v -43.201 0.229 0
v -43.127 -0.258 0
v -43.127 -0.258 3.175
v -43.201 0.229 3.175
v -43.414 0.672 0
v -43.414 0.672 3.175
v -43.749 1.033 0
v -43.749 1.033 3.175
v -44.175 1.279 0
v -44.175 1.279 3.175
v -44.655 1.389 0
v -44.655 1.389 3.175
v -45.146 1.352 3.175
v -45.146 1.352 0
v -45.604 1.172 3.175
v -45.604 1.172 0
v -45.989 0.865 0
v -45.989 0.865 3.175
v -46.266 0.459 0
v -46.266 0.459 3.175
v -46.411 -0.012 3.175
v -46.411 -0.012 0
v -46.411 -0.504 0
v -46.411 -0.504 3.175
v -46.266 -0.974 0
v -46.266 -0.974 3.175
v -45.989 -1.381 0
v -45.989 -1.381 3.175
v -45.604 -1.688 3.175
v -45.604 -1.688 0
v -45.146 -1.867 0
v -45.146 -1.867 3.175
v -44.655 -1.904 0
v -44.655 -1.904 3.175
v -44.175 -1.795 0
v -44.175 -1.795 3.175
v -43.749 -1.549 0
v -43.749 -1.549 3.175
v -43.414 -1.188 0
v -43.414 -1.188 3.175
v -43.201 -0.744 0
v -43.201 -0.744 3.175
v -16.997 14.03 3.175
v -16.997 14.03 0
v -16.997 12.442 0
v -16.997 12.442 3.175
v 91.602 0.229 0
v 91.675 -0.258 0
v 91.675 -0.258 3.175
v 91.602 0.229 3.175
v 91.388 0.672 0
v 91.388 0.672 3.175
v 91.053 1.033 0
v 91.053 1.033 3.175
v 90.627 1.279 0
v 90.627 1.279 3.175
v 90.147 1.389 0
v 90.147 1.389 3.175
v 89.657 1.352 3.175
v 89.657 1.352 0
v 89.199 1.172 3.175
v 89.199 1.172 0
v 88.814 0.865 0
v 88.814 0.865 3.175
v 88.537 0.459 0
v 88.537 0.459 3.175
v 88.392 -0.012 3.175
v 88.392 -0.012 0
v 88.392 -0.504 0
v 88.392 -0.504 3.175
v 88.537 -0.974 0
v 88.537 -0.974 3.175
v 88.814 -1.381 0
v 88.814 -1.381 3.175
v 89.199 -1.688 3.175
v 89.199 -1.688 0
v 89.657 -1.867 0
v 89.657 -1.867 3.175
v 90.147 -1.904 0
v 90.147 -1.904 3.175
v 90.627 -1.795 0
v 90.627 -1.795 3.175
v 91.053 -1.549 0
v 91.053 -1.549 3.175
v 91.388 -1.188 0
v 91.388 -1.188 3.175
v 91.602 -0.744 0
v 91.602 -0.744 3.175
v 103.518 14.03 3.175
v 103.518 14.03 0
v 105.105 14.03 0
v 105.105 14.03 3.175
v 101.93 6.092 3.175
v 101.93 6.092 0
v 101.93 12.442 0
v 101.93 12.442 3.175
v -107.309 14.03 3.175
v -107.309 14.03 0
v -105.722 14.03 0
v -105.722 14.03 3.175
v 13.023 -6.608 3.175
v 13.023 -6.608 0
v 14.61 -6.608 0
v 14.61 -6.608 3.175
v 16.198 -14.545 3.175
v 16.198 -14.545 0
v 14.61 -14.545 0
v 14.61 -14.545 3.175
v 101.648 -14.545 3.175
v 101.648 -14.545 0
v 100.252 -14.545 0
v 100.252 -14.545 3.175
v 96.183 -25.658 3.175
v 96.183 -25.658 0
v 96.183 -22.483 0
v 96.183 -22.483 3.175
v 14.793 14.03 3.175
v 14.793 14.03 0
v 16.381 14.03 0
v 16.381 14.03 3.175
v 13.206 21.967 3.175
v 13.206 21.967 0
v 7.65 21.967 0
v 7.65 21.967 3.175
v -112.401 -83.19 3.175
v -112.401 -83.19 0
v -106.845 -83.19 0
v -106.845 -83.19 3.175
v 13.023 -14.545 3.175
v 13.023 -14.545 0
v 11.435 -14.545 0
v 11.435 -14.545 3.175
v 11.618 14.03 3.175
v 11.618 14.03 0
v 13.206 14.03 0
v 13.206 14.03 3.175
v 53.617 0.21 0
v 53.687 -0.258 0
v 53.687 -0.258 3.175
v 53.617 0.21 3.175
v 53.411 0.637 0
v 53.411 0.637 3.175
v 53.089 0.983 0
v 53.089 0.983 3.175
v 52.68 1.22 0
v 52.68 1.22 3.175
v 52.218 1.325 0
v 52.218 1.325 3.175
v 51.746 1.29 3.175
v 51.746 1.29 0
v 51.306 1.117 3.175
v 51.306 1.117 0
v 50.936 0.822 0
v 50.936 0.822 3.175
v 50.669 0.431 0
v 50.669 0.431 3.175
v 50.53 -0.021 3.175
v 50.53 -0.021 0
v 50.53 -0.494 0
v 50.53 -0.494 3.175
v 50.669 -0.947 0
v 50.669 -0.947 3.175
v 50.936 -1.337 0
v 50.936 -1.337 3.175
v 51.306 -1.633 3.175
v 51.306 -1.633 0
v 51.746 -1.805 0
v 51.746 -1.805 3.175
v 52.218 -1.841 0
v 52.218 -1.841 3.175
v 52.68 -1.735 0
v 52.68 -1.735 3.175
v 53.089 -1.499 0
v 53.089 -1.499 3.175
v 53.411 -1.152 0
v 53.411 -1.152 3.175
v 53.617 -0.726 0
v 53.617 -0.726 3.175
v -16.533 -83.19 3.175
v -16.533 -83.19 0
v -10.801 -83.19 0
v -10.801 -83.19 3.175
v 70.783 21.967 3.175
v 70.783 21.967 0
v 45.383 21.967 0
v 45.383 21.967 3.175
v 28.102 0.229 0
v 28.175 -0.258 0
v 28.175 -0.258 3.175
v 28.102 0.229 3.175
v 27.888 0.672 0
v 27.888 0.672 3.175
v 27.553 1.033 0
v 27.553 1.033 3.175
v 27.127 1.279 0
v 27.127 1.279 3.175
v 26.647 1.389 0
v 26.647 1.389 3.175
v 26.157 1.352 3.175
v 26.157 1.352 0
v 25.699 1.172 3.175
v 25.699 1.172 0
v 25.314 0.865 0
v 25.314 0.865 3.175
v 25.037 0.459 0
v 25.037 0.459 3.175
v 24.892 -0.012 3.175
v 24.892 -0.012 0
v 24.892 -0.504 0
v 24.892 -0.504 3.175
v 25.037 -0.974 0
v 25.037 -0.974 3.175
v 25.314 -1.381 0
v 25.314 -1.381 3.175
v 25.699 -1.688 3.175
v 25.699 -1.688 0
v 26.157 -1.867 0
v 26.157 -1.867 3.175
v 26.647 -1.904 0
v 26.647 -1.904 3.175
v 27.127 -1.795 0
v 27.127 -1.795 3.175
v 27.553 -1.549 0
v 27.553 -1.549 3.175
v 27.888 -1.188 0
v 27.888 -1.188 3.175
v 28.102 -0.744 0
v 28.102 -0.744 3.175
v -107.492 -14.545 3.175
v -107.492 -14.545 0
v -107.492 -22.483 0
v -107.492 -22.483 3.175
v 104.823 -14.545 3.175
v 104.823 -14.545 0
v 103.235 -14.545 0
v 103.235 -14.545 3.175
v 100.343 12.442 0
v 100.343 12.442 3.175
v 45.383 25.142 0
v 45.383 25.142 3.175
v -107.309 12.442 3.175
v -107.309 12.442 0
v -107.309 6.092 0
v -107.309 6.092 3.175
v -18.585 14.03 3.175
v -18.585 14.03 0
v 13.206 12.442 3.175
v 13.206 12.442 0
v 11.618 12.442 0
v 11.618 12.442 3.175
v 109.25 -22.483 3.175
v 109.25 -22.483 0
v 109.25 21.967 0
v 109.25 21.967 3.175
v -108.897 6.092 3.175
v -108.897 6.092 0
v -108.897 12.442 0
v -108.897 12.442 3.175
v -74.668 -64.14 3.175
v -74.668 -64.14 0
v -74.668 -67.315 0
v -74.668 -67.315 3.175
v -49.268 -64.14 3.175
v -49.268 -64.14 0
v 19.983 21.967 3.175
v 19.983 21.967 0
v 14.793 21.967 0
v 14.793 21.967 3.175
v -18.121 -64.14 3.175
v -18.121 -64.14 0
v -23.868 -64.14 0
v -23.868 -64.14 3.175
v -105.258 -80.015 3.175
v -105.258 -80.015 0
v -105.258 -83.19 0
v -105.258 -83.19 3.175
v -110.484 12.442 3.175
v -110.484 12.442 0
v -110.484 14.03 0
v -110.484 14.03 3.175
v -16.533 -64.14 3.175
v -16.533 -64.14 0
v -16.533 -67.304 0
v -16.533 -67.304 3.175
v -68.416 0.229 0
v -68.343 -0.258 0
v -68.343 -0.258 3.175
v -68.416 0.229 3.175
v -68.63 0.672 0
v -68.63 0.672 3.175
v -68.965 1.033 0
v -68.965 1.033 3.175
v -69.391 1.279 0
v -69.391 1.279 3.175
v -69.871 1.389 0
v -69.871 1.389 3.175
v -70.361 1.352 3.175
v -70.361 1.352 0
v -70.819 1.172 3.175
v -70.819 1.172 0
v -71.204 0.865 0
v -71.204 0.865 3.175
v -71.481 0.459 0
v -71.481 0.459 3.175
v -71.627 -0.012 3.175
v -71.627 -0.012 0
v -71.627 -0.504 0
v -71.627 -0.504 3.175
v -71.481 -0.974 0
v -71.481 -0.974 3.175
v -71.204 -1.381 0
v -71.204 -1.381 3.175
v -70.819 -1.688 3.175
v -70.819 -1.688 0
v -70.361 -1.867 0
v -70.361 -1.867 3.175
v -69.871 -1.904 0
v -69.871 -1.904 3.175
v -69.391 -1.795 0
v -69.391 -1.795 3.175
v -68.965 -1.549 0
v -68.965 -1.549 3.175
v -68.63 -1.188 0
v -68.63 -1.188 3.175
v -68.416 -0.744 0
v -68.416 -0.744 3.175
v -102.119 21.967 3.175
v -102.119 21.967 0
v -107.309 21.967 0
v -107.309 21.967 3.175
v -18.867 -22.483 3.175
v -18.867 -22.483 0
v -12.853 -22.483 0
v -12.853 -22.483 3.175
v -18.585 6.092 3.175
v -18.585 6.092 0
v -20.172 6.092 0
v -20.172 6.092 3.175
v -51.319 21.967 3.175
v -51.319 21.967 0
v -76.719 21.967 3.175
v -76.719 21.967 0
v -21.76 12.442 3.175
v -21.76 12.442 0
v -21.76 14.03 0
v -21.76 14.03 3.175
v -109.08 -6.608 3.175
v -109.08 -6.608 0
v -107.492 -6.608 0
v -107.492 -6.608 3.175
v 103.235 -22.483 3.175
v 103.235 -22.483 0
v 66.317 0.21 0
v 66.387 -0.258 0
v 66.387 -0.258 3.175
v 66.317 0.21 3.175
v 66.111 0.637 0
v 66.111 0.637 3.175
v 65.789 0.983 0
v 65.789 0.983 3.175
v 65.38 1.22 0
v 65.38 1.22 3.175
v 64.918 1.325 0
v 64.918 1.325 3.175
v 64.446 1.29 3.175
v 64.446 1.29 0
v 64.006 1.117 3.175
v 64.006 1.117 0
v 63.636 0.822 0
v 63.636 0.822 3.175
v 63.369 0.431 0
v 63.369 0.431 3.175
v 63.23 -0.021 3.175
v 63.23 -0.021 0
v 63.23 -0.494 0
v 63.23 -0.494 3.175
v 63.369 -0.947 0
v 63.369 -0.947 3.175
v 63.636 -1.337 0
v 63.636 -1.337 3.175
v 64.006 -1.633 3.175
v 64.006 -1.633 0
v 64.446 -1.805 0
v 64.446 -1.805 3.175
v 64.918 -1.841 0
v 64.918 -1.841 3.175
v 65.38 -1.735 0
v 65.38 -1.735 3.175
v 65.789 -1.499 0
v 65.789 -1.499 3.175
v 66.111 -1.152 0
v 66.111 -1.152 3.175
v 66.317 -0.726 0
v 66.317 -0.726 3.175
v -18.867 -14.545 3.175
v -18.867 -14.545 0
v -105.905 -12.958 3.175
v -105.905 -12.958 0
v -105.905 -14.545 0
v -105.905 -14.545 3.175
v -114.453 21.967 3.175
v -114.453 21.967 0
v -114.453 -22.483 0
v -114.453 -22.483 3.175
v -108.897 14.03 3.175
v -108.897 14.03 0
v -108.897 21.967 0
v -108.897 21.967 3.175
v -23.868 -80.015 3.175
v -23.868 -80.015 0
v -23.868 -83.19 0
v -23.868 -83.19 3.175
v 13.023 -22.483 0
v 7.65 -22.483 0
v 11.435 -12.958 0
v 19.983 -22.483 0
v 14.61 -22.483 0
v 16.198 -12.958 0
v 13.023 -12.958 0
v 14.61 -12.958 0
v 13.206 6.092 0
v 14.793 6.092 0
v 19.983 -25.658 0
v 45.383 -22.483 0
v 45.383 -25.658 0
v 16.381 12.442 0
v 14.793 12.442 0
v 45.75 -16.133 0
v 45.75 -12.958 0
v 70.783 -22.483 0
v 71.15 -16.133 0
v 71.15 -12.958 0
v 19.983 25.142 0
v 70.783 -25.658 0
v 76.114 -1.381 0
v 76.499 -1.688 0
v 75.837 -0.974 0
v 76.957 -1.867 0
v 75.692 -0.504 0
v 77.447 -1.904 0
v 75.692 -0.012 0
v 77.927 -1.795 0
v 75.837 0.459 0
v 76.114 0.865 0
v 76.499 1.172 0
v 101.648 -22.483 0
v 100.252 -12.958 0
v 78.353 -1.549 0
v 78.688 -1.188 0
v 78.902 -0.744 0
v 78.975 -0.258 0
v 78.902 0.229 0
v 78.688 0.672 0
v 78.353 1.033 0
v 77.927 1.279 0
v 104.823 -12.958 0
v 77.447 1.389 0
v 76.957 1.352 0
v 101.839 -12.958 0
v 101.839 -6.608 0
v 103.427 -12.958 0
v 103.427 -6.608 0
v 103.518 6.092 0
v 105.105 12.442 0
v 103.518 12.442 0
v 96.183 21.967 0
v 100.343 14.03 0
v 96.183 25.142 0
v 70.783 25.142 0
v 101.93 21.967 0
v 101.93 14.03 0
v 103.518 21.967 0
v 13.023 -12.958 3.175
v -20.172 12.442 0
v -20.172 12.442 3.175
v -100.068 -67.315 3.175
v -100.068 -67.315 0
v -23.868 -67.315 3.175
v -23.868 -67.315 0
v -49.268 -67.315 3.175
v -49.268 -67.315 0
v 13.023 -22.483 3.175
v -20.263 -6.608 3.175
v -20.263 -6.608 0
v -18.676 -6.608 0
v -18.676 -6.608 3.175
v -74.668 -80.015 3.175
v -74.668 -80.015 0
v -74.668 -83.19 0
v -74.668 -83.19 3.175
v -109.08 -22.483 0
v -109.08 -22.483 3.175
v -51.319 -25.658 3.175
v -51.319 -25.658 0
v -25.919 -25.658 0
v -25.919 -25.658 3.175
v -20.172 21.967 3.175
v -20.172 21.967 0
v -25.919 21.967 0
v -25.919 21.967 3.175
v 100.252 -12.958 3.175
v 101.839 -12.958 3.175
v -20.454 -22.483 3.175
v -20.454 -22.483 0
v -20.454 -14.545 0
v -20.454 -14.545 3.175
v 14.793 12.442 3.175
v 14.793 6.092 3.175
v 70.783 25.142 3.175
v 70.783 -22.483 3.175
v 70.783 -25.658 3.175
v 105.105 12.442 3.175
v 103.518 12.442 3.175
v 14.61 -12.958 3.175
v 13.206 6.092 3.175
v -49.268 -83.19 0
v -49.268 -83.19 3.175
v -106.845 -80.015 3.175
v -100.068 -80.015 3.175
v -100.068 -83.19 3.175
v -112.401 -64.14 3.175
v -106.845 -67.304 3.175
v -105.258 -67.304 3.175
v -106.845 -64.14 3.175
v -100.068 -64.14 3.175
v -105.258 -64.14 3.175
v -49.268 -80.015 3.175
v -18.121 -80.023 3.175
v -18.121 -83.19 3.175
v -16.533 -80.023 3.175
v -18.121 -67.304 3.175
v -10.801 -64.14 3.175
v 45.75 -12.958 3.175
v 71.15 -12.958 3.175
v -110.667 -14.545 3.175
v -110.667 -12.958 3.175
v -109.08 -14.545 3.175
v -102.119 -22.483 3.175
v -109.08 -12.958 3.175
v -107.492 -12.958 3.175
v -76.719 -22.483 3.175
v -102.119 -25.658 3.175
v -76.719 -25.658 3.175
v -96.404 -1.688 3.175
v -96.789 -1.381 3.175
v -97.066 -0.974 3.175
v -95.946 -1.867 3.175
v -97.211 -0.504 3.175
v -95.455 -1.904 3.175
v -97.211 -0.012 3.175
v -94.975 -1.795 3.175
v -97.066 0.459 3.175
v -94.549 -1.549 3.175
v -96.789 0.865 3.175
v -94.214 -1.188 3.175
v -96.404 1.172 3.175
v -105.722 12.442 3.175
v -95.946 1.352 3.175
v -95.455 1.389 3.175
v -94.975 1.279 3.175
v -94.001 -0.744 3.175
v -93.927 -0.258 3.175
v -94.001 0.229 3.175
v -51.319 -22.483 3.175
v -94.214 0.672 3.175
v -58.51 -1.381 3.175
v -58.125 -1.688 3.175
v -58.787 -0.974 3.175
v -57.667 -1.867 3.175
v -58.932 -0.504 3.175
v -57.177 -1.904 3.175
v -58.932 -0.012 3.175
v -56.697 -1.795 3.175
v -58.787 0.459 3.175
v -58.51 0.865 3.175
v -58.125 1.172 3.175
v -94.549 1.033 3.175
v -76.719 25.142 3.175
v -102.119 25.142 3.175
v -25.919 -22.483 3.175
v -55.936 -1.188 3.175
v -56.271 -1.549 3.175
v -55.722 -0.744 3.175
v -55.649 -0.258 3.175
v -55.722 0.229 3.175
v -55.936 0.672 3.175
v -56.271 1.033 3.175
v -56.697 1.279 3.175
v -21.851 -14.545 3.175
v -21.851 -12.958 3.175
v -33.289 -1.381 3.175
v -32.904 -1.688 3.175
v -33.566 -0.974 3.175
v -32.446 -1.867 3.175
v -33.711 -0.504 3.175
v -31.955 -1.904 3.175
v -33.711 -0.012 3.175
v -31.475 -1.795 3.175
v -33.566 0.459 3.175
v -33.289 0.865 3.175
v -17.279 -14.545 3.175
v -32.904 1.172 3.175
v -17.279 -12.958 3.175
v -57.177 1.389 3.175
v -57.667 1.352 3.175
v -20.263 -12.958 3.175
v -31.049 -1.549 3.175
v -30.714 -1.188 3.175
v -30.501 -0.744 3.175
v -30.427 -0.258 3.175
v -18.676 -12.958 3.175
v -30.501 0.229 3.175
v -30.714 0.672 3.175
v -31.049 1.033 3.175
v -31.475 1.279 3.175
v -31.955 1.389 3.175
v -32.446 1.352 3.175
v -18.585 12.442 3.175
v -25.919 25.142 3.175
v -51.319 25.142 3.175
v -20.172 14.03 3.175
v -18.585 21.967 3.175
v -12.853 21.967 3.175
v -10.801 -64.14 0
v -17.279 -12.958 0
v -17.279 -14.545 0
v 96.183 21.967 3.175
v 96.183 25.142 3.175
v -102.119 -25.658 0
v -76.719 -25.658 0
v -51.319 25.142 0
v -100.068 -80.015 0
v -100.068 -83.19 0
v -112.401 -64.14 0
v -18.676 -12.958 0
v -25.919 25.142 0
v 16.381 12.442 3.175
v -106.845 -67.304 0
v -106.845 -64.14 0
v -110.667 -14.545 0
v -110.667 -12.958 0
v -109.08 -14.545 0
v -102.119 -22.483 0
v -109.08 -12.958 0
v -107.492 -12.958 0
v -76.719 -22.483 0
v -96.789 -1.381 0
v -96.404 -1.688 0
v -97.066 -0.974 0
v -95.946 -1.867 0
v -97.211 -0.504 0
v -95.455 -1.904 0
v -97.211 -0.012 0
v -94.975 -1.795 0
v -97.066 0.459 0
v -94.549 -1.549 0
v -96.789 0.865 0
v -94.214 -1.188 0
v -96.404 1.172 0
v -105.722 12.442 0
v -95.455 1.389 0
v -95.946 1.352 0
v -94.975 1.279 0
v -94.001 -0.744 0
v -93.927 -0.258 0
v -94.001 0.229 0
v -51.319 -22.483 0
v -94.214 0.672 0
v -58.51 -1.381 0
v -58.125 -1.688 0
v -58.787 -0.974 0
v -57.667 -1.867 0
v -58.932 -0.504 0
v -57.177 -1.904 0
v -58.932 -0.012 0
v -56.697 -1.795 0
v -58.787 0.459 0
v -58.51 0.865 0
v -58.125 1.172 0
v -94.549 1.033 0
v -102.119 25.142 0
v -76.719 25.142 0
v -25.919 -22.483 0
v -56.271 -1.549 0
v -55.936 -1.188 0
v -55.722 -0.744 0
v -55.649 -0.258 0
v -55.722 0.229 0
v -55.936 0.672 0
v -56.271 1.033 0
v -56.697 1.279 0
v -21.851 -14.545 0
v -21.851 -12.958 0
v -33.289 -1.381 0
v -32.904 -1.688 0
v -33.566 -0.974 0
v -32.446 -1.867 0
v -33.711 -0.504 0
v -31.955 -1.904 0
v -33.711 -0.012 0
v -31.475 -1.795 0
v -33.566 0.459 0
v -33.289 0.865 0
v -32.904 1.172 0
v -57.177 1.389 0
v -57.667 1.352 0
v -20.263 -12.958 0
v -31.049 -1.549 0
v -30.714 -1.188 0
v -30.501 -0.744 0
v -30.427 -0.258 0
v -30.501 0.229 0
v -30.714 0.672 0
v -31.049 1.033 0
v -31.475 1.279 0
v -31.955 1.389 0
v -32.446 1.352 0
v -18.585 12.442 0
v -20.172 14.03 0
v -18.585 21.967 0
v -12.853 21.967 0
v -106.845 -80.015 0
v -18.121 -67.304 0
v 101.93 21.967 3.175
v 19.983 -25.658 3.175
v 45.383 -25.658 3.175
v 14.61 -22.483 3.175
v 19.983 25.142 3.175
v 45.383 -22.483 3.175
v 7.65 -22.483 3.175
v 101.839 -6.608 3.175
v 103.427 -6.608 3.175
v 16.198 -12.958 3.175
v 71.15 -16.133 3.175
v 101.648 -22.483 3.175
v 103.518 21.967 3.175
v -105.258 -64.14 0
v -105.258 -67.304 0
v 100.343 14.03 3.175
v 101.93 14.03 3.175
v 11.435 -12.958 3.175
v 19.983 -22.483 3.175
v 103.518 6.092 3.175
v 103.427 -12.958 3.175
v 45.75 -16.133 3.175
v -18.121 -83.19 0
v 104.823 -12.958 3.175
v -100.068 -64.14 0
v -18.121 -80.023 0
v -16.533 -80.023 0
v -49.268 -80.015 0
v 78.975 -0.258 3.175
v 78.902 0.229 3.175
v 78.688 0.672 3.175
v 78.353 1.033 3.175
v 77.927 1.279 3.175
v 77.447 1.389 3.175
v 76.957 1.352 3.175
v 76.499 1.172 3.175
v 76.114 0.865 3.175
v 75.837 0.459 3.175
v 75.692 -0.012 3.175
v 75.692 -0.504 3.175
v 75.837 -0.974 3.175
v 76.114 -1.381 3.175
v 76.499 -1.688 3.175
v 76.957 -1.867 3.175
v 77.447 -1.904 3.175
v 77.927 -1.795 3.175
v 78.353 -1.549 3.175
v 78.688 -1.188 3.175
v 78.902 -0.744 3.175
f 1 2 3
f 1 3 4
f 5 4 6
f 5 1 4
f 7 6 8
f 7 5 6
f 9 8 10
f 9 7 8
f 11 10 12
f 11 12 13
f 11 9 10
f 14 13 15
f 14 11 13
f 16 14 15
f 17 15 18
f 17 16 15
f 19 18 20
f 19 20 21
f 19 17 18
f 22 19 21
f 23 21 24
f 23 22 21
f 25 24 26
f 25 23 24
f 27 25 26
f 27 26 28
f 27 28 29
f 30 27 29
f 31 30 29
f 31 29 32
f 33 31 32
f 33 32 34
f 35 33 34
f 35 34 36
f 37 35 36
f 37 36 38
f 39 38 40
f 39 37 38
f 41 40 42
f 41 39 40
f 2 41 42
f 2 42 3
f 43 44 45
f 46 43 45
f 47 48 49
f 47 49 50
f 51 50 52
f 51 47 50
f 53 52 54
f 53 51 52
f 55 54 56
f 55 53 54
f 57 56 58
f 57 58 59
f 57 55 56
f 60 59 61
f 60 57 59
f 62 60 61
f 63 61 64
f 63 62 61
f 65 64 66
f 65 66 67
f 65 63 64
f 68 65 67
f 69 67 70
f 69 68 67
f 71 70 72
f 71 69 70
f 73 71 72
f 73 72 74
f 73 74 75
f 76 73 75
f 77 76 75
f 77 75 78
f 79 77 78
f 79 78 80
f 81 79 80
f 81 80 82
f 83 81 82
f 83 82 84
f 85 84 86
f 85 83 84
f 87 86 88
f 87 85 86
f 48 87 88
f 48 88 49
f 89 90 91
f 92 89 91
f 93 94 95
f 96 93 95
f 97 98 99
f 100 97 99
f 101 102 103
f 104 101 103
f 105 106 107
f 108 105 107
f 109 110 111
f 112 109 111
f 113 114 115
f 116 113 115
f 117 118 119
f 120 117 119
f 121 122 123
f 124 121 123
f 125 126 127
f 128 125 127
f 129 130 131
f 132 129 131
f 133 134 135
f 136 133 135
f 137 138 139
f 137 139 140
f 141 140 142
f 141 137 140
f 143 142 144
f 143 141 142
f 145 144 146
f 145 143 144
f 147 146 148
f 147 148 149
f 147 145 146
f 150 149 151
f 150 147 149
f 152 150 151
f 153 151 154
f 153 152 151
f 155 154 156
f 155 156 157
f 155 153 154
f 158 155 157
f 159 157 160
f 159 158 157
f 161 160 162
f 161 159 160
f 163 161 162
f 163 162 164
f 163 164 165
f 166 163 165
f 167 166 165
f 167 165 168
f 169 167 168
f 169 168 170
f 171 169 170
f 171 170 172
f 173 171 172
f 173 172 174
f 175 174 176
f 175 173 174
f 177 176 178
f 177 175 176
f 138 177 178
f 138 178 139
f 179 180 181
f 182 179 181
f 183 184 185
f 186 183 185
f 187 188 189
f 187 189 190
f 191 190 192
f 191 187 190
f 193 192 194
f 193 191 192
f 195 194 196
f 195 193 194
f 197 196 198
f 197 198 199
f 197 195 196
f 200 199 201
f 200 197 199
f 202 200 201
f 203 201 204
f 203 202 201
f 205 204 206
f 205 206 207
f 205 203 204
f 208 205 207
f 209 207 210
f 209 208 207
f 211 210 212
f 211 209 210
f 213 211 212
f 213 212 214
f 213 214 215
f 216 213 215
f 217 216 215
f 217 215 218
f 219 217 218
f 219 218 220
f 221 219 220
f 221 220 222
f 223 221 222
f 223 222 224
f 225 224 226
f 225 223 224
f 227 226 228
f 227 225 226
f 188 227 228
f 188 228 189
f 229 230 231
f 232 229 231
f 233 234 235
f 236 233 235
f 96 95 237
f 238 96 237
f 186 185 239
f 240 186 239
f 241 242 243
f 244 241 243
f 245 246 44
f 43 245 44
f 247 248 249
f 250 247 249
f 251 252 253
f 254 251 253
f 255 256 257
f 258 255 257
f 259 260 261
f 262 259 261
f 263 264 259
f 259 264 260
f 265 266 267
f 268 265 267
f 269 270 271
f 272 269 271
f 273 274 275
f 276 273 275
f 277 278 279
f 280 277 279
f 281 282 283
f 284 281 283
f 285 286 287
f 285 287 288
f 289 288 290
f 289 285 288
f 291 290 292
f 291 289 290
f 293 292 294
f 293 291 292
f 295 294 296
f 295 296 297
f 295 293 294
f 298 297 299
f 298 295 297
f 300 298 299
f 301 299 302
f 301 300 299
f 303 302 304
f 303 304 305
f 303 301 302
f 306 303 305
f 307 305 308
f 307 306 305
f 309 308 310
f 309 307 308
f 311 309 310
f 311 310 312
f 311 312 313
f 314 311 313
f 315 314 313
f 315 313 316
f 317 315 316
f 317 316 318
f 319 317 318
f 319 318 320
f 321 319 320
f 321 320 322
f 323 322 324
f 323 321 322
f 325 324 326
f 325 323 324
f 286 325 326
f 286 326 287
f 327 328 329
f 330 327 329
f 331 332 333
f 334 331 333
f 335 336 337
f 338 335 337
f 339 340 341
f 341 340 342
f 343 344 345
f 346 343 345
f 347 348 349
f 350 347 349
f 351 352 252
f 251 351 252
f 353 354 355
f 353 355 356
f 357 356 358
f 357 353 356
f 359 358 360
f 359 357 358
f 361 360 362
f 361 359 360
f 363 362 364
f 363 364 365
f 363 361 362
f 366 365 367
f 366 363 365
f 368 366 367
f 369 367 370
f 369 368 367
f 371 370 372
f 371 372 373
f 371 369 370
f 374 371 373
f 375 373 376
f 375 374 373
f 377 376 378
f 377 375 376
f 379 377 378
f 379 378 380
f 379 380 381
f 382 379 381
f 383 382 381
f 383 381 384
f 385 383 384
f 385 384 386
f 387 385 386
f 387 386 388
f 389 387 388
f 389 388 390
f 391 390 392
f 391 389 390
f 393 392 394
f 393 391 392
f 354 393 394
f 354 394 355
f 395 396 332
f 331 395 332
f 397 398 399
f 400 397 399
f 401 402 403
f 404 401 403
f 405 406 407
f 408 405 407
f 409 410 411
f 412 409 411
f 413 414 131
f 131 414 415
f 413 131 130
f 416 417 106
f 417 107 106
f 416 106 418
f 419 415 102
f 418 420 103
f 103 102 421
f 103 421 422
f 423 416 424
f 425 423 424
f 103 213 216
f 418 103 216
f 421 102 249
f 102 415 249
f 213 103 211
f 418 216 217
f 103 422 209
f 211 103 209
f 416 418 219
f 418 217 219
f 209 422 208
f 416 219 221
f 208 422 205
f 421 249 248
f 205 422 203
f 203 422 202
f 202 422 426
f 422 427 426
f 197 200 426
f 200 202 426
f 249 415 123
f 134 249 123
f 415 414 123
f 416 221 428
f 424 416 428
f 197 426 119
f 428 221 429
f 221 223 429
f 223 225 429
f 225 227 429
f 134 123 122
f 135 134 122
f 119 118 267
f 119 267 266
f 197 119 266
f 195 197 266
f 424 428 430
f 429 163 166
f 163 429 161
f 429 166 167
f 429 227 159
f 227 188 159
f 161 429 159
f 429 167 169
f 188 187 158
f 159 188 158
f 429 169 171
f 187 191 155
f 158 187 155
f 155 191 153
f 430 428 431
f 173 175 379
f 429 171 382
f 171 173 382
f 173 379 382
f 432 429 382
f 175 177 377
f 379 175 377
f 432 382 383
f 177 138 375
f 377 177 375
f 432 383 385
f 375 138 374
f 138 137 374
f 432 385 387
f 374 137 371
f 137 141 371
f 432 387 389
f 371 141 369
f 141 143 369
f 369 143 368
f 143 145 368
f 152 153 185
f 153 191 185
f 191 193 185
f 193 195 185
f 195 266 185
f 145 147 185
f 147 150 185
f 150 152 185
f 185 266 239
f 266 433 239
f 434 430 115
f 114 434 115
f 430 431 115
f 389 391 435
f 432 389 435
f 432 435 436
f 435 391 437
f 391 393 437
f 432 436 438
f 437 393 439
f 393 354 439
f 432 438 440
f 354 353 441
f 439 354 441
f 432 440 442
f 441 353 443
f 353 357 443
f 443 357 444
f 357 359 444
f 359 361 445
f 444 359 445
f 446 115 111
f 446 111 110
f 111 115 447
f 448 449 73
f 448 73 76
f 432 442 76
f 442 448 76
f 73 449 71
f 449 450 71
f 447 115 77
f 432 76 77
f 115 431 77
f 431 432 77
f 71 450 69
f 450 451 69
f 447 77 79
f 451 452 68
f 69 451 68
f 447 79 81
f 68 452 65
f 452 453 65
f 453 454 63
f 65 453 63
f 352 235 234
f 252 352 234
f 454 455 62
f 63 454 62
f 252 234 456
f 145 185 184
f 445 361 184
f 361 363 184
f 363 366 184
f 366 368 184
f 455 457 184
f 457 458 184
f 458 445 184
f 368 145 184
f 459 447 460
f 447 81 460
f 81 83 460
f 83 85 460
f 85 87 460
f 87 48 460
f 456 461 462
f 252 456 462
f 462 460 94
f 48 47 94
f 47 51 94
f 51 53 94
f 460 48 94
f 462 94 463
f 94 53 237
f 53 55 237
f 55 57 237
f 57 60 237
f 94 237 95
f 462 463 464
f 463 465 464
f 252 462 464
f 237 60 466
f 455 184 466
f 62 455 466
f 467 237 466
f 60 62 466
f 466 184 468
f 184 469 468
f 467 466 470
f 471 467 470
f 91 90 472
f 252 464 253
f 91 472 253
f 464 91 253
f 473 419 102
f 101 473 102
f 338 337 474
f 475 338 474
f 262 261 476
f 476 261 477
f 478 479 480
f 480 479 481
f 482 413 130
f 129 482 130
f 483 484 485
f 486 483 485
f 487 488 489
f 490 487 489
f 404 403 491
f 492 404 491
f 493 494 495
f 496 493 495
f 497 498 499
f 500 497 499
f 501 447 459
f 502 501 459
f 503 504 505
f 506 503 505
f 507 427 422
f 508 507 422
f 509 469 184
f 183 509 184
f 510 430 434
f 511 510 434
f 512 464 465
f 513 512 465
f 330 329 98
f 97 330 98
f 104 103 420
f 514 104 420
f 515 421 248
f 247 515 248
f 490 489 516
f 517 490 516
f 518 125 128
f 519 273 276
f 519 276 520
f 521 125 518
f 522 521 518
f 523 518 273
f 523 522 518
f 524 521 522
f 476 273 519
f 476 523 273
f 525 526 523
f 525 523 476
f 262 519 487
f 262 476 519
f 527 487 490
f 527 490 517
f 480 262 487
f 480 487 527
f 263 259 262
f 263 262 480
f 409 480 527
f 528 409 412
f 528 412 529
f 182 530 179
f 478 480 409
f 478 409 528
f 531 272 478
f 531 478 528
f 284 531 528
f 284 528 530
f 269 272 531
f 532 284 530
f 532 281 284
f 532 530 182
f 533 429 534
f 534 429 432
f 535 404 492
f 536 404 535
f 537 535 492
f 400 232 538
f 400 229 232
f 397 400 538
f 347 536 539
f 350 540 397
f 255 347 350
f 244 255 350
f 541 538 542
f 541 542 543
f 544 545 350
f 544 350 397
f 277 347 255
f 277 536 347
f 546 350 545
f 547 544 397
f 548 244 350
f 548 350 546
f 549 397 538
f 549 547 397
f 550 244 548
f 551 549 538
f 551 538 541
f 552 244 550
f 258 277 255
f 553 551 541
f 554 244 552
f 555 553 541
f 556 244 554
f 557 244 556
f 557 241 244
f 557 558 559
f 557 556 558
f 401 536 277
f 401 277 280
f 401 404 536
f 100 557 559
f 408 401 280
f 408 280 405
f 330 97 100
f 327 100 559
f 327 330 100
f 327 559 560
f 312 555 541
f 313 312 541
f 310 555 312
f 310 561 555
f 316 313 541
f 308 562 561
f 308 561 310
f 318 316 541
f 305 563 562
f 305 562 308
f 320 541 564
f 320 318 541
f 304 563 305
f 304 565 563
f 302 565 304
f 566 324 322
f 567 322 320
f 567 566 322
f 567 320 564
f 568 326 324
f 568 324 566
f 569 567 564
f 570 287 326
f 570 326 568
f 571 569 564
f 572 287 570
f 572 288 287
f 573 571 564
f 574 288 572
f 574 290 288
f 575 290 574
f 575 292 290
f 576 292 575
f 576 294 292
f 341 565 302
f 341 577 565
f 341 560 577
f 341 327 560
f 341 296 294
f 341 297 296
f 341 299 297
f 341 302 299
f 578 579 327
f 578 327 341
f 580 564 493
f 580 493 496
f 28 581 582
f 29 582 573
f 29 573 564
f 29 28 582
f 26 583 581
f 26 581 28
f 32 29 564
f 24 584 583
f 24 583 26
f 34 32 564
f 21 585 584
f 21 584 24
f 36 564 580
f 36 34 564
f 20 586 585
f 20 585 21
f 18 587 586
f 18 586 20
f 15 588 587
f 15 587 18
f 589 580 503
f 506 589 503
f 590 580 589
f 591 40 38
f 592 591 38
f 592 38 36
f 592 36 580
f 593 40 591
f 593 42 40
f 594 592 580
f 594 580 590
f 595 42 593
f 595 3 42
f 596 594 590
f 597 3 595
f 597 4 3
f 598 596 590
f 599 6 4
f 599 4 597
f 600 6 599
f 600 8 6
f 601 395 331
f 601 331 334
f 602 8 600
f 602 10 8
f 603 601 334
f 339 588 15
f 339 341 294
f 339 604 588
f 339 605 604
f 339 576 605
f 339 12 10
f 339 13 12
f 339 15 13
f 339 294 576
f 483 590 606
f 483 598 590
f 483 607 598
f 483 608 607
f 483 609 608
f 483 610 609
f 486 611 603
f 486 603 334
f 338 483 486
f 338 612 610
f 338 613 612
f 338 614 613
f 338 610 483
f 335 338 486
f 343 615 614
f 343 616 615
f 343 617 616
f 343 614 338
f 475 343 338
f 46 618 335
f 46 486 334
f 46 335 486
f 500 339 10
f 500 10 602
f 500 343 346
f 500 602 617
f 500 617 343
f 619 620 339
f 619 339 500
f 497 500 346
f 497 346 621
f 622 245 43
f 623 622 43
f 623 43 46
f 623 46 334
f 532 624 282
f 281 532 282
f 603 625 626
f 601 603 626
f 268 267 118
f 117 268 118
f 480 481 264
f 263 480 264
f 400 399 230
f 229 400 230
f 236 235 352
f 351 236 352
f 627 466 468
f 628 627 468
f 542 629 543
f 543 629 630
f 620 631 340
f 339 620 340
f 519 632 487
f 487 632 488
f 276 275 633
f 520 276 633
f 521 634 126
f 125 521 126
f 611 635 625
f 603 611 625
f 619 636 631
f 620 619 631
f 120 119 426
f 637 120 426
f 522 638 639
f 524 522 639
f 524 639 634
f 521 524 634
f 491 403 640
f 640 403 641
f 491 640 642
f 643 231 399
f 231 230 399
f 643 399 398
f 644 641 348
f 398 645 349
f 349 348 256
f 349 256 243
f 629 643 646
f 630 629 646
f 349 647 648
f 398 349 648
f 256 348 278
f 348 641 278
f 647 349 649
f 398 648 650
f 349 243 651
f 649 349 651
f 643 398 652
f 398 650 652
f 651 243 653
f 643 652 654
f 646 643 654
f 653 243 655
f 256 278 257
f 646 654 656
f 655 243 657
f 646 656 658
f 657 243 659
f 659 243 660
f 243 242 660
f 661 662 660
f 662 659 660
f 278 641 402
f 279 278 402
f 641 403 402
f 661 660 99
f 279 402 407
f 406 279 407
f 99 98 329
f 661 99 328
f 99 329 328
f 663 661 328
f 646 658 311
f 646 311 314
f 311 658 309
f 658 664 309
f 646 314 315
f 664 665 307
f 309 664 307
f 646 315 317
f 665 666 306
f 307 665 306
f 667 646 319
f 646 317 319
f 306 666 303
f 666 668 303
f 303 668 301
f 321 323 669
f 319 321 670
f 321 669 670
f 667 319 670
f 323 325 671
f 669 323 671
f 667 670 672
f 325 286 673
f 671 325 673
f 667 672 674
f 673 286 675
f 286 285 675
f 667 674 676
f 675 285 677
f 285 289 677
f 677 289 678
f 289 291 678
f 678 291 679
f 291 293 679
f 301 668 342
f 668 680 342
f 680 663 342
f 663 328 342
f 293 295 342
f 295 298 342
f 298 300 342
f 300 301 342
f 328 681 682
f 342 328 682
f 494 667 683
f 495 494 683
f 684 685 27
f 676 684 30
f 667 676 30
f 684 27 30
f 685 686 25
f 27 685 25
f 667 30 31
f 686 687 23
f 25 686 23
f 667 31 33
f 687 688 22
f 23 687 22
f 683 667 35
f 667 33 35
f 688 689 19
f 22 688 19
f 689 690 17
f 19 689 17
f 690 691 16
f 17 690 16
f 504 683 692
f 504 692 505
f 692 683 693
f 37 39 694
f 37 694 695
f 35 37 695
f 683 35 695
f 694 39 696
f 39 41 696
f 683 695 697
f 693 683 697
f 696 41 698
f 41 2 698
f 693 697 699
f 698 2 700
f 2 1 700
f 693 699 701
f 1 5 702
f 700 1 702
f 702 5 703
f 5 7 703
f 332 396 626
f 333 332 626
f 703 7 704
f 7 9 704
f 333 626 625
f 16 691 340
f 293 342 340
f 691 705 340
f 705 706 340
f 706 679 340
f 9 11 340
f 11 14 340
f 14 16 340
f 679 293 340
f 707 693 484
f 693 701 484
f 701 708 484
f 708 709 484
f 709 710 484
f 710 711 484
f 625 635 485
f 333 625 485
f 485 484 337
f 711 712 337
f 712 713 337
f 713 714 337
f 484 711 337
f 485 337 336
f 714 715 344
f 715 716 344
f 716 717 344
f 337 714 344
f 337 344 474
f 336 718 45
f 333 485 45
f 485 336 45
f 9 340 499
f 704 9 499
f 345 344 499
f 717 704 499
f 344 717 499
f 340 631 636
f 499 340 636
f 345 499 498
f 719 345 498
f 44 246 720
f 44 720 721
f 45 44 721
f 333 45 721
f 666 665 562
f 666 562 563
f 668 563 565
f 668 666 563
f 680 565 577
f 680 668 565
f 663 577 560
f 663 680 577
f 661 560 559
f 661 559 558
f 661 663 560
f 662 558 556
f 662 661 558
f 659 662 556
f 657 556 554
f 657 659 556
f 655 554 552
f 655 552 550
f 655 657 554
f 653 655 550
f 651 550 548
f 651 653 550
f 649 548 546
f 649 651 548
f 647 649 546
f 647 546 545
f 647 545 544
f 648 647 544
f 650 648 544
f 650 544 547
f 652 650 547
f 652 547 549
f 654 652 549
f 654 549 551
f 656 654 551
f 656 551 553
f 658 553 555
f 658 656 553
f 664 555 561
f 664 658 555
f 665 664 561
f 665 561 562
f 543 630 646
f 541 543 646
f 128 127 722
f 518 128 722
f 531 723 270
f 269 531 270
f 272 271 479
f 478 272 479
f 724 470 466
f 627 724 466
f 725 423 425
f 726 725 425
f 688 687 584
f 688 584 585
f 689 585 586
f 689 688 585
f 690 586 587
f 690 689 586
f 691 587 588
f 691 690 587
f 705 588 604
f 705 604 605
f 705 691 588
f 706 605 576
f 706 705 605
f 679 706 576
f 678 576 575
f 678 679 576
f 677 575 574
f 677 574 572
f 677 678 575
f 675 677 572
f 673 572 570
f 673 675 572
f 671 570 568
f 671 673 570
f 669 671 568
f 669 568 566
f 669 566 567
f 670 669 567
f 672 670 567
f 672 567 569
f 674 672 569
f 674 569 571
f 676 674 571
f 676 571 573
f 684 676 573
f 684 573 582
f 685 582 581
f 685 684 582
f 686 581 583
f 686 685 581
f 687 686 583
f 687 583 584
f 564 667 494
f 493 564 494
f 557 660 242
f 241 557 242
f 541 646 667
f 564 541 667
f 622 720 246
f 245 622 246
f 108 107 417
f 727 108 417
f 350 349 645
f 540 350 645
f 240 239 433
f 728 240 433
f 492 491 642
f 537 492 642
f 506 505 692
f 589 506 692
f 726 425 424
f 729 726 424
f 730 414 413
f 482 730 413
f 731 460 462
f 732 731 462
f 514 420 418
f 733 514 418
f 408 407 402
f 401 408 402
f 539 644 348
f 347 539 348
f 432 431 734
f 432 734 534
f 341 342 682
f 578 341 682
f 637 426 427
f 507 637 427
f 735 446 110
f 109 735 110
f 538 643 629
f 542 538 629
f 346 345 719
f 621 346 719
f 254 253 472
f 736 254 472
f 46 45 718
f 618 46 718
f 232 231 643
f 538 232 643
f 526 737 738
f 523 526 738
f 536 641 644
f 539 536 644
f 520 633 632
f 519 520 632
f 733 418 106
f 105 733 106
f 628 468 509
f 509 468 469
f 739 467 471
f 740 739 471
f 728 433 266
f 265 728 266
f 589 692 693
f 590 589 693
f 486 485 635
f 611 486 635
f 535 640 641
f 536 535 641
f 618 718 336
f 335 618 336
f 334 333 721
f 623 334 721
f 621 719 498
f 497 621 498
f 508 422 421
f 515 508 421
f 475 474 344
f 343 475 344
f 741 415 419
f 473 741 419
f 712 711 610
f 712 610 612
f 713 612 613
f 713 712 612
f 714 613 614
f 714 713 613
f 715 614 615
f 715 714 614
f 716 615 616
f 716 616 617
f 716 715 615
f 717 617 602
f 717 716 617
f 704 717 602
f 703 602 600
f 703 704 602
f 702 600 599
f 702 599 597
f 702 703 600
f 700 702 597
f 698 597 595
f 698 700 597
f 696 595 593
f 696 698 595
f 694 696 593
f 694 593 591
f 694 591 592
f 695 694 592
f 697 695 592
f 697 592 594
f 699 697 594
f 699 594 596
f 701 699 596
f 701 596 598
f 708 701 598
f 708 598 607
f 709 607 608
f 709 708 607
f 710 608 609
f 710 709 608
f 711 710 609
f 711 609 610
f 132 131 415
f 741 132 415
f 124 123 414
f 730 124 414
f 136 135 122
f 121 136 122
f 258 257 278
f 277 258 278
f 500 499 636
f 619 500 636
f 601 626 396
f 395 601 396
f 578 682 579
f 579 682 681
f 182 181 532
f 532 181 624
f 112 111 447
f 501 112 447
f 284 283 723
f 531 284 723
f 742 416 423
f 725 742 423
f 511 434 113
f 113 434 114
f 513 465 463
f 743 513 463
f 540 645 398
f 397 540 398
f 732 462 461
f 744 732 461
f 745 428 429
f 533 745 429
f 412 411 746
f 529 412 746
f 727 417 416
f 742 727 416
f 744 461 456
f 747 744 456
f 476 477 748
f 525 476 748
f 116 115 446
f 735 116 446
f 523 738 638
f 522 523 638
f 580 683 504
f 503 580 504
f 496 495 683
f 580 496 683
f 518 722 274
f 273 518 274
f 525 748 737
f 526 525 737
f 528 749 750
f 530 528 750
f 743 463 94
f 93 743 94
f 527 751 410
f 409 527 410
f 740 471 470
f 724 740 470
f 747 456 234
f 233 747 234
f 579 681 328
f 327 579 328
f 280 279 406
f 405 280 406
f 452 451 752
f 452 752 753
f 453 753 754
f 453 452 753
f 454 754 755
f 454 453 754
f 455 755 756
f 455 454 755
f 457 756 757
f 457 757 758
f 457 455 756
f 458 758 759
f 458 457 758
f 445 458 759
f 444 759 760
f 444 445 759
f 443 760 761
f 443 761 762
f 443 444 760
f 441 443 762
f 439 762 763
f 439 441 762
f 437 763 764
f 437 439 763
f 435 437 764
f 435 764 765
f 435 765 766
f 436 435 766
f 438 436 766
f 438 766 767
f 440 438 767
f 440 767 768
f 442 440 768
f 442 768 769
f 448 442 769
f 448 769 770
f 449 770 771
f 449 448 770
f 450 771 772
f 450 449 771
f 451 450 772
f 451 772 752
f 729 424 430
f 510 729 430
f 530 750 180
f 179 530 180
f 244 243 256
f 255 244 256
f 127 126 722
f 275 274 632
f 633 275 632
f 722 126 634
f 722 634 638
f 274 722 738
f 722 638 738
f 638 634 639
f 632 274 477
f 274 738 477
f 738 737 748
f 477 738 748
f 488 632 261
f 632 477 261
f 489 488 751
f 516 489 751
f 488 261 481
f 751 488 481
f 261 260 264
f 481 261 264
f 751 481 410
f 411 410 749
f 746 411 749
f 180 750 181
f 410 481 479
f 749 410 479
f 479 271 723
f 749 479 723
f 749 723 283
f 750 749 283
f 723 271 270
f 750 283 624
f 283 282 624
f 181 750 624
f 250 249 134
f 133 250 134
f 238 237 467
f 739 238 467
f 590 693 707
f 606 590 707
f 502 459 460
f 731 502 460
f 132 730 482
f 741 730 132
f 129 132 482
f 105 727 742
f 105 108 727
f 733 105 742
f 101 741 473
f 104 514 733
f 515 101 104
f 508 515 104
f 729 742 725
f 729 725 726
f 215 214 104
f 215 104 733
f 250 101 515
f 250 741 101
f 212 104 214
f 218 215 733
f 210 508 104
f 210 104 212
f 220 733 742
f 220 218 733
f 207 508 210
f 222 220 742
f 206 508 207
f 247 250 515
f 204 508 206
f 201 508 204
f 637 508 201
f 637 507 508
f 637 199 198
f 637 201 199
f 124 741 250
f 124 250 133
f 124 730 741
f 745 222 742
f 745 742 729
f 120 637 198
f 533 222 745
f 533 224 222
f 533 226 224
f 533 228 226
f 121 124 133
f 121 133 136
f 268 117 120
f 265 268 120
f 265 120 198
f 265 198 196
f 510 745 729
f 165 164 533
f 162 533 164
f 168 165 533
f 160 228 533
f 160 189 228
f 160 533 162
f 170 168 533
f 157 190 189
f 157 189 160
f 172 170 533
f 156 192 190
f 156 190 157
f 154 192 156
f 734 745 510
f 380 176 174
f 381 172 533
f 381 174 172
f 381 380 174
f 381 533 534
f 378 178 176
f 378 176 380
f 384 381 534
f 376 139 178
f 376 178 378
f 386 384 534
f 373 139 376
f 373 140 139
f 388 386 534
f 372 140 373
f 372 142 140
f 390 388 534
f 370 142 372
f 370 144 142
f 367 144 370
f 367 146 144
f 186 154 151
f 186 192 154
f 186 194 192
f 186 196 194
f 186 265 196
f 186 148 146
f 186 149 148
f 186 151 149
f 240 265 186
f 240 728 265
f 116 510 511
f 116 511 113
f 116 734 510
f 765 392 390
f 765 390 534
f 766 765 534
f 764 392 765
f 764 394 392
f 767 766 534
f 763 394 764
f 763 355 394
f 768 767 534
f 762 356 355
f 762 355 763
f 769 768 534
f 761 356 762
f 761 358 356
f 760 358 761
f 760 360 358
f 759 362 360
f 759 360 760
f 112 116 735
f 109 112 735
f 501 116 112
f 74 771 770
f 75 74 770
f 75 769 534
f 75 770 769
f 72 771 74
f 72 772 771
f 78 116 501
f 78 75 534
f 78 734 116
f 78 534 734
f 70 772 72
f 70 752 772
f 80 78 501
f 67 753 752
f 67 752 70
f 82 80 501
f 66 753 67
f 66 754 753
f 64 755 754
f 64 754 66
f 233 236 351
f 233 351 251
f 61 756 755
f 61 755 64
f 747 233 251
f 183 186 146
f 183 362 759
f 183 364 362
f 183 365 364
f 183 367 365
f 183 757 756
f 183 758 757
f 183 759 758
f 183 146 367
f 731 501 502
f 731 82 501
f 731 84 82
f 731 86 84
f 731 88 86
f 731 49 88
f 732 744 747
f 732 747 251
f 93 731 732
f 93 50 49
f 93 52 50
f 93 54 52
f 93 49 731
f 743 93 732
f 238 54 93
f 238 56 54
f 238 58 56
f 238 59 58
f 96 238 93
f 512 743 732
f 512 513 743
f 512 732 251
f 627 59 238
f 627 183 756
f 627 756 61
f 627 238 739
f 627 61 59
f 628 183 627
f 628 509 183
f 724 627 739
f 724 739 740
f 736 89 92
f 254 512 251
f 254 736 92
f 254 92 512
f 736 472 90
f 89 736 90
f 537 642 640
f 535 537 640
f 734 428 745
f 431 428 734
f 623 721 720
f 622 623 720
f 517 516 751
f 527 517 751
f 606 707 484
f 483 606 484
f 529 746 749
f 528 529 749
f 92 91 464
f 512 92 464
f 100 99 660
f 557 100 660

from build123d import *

# Parameters (mm, degrees)
F0_W     = 25.4
F0_H     = 3.175
F0_R     = 1.651
F0_R_2   = 1.5875
F1_DEPTH = 3.175


# Not quite as in the source:
# - a length typed as a fraction of an inch, garbled in the dataset ("3 / 203.2 mm" for 3/8 in), is restored


with BuildPart() as f1:
    # F0 (on Top) → F1 (new body)
    with BuildSketch(Plane.XY):
        Polygon((14.6100838328, -22.482711039), (19.9830344046, -22.482711039), (19.9830344046, -25.657711039), (45.3830344046, -25.657711039), (45.3830344046, -22.482711039), (70.7830344046, -22.482711039), (70.7830344046, -25.657711039), (96.1830344046, -25.657711039), (96.1830344046, -22.482711039), (101.6479595924, -22.482711039), (101.6479595924, -14.545211039), (100.2515068019, -14.545211039), (100.2515068019, -12.957711039), (101.8390068019, -12.957711039), (101.8390068019, -6.607711039), (103.4265068019, -6.607711039), (103.4265068019, -12.957711039), (104.8229595924, -12.957711039), (104.8229595924, -14.545211039), (103.2354595924, -14.545211039), (103.2354595924, -22.482711039), (109.2496332611, -22.482711039), (109.2496332611, 21.967288961), (103.5178316141, 21.967288961), (103.5178316141, 14.029788961), (105.1053316141, 14.029788961), (105.1053316141, 12.442288961), (103.5178316141, 12.442288961), (103.5178316141, 6.092288961), (101.9303316141, 6.092288961), (101.9303316141, 12.442288961), (100.3428316141, 12.442288961), (100.3428316141, 14.029788961), (101.9303316141, 14.029788961), (101.9303316141, 21.967288961), (96.1830344046, 21.967288961), (96.1830344046, 25.142288961), (70.7830344046, 25.142288961), (70.7830344046, 21.967288961), (45.3830344046, 21.967288961), (45.3830344046, 25.142288961), (19.9830344046, 25.142288961), (19.9830344046, 21.967288961), (14.7933832611, 21.967288961), (14.7933832611, 14.029788961), (16.3808832611, 14.029788961), (16.3808832611, 12.442288961), (14.7933832611, 12.442288961), (14.7933832611, 6.092288961), (13.2058832611, 6.092288961), (13.2058832611, 12.442288961), (11.6183832611, 12.442288961), (11.6183832611, 14.029788961), (13.2058832611, 14.029788961), (13.2058832611, 21.967288961), (7.6496332611, 21.967288961), (7.6496332611, -22.482711039), (13.0225838328, -22.482711039), (13.0225838328, -14.545211039), (11.4350838328, -14.545211039), (11.4350838328, -12.957711039), (13.0225838328, -12.957711039), (13.0225838328, -6.607711039), (13.8163338328, -6.607711039), (14.6100838328, -6.607711039), (14.6100838328, -12.957711039), (16.1975838328, -12.957711039), (16.1975838328, -14.545211039), (14.6100838328, -14.545211039), align=None)
        with Locations((58.4496332611, -14.545211039)):
            Rectangle(F0_W, F0_H, mode=Mode.SUBTRACT)
        with Locations((26.5240816141, -0.257711039)):
            Circle(F0_R, mode=Mode.SUBTRACT)
        with Locations((52.0996332611, -0.257711039)):
            Circle(F0_R_2, mode=Mode.SUBTRACT)
        with Locations((64.7996332611, -0.257711039)):
            Circle(F0_R_2, mode=Mode.SUBTRACT)
        with Locations((77.3240816141, -0.257711039)):
            Circle(F0_R, mode=Mode.SUBTRACT)
        with Locations((90.0240816141, -0.257711039)):
            Circle(F0_R, mode=Mode.SUBTRACT)
    extrude(amount=F1_DEPTH)


with BuildPart() as f1b:
    # F0 (on Top) → F1, piece 2 (new body)
    with BuildSketch(Plane.XY):
        Polygon((-107.4923401093, -22.482711039), (-102.1193895375, -22.482711039), (-102.1193895375, -25.657711039), (-76.7193895375, -25.657711039), (-76.7193895375, -22.482711039), (-51.3193895375, -22.482711039), (-51.3193895375, -25.657711039), (-25.9193895375, -25.657711039), (-25.9193895375, -22.482711039), (-20.4544643497, -22.482711039), (-20.4544643497, -14.545211039), (-21.8509171402, -14.545211039), (-21.8509171402, -12.957711039), (-20.2634171402, -12.957711039), (-20.2634171402, -6.607711039), (-18.6759171402, -6.607711039), (-18.6759171402, -12.957711039), (-17.2794643497, -12.957711039), (-17.2794643497, -14.545211039), (-18.8669643497, -14.545211039), (-18.8669643497, -22.482711039), (-12.852790681, -22.482711039), (-12.852790681, 21.967288961), (-18.584592328, 21.967288961), (-18.584592328, 14.029788961), (-16.997092328, 14.029788961), (-16.997092328, 12.442288961), (-18.584592328, 12.442288961), (-18.584592328, 6.092288961), (-20.172092328, 6.092288961), (-20.172092328, 12.442288961), (-21.759592328, 12.442288961), (-21.759592328, 14.029788961), (-20.172092328, 14.029788961), (-20.172092328, 21.967288961), (-25.9193895375, 21.967288961), (-25.9193895375, 25.142288961), (-51.3193895375, 25.142288961), (-51.3193895375, 21.967288961), (-76.7193895375, 21.967288961), (-76.7193895375, 25.142288961), (-102.1193895375, 25.142288961), (-102.1193895375, 21.967288961), (-107.309040681, 21.967288961), (-107.309040681, 14.029788961), (-105.721540681, 14.029788961), (-105.721540681, 12.442288961), (-107.309040681, 12.442288961), (-107.309040681, 6.092288961), (-108.896540681, 6.092288961), (-108.896540681, 12.442288961), (-110.484040681, 12.442288961), (-110.484040681, 14.029788961), (-108.896540681, 14.029788961), (-108.896540681, 21.967288961), (-114.452790681, 21.967288961), (-114.452790681, -22.482711039), (-109.0798401093, -22.482711039), (-109.0798401093, -14.545211039), (-110.6673401093, -14.545211039), (-110.6673401093, -12.957711039), (-109.0798401093, -12.957711039), (-109.0798401093, -6.607711039), (-108.2860901093, -6.607711039), (-107.4923401093, -6.607711039), (-107.4923401093, -12.957711039), (-105.9048401093, -12.957711039), (-105.9048401093, -14.545211039), (-107.4923401093, -14.545211039), align=None)
        with Locations((-95.578342328, -0.257711039)):
            Circle(F0_R, mode=Mode.SUBTRACT)
        with Locations((-69.9939727783, -0.257711039)):
            Circle(F0_R, mode=Mode.SUBTRACT)
        with Locations((-57.2999119759, -0.257711039)):
            Circle(F0_R, mode=Mode.SUBTRACT)
        with Locations((-44.778342328, -0.257711039)):
            Circle(F0_R, mode=Mode.SUBTRACT)
        with Locations((-32.078342328, -0.257711039)):
            Circle(F0_R, mode=Mode.SUBTRACT)
    extrude(amount=F1_DEPTH)


with BuildPart() as f1c:
    # F0 (on Top) → F1, piece 3 (new body)
    with BuildSketch(Plane.XY):
        Polygon((-100.0680774225, -80.0153038105), (-74.6680774225, -80.0153038105), (-74.6680774225, -83.1903038105), (-49.2680774225, -83.1903038105), (-49.2680774225, -80.0153038105), (-23.8680774225, -80.0153038105), (-23.8680774225, -83.1903038105), (-18.120780213, -83.1903038105), (-18.120780213, -80.0231885267), (-16.533280213, -80.0231885267), (-16.533280213, -83.1903038105), (-10.8014785661, -83.1903038105), (-10.8014785661, -64.1403038105), (-16.533280213, -64.1403038105), (-16.533280213, -67.3043401082), (-18.120780213, -67.3043401082), (-18.120780213, -64.1403038105), (-23.8680774225, -64.1403038105), (-23.8680774225, -67.3153038105), (-49.2680774225, -67.3153038105), (-49.2680774225, -64.1403038105), (-74.6680774225, -64.1403038105), (-74.6680774225, -67.3153038105), (-100.0680774225, -67.3153038105), (-100.0680774225, -64.1403038105), (-105.2577285661, -64.1403038105), (-105.2577285661, -67.3043401082), (-106.8452285661, -67.3043401082), (-106.8452285661, -64.1403038105), (-112.4014785661, -64.1403038105), (-112.4014785661, -83.1903038105), (-106.8452285661, -83.1903038105), (-106.8452285661, -80.0153038105), (-105.2577285661, -80.0153038105), (-105.2577285661, -83.1903038105), (-100.0680774225, -83.1903038105), align=None)
    extrude(amount=F1_DEPTH)


solid = Compound([f1.part, f1b.part, f1c.part])
